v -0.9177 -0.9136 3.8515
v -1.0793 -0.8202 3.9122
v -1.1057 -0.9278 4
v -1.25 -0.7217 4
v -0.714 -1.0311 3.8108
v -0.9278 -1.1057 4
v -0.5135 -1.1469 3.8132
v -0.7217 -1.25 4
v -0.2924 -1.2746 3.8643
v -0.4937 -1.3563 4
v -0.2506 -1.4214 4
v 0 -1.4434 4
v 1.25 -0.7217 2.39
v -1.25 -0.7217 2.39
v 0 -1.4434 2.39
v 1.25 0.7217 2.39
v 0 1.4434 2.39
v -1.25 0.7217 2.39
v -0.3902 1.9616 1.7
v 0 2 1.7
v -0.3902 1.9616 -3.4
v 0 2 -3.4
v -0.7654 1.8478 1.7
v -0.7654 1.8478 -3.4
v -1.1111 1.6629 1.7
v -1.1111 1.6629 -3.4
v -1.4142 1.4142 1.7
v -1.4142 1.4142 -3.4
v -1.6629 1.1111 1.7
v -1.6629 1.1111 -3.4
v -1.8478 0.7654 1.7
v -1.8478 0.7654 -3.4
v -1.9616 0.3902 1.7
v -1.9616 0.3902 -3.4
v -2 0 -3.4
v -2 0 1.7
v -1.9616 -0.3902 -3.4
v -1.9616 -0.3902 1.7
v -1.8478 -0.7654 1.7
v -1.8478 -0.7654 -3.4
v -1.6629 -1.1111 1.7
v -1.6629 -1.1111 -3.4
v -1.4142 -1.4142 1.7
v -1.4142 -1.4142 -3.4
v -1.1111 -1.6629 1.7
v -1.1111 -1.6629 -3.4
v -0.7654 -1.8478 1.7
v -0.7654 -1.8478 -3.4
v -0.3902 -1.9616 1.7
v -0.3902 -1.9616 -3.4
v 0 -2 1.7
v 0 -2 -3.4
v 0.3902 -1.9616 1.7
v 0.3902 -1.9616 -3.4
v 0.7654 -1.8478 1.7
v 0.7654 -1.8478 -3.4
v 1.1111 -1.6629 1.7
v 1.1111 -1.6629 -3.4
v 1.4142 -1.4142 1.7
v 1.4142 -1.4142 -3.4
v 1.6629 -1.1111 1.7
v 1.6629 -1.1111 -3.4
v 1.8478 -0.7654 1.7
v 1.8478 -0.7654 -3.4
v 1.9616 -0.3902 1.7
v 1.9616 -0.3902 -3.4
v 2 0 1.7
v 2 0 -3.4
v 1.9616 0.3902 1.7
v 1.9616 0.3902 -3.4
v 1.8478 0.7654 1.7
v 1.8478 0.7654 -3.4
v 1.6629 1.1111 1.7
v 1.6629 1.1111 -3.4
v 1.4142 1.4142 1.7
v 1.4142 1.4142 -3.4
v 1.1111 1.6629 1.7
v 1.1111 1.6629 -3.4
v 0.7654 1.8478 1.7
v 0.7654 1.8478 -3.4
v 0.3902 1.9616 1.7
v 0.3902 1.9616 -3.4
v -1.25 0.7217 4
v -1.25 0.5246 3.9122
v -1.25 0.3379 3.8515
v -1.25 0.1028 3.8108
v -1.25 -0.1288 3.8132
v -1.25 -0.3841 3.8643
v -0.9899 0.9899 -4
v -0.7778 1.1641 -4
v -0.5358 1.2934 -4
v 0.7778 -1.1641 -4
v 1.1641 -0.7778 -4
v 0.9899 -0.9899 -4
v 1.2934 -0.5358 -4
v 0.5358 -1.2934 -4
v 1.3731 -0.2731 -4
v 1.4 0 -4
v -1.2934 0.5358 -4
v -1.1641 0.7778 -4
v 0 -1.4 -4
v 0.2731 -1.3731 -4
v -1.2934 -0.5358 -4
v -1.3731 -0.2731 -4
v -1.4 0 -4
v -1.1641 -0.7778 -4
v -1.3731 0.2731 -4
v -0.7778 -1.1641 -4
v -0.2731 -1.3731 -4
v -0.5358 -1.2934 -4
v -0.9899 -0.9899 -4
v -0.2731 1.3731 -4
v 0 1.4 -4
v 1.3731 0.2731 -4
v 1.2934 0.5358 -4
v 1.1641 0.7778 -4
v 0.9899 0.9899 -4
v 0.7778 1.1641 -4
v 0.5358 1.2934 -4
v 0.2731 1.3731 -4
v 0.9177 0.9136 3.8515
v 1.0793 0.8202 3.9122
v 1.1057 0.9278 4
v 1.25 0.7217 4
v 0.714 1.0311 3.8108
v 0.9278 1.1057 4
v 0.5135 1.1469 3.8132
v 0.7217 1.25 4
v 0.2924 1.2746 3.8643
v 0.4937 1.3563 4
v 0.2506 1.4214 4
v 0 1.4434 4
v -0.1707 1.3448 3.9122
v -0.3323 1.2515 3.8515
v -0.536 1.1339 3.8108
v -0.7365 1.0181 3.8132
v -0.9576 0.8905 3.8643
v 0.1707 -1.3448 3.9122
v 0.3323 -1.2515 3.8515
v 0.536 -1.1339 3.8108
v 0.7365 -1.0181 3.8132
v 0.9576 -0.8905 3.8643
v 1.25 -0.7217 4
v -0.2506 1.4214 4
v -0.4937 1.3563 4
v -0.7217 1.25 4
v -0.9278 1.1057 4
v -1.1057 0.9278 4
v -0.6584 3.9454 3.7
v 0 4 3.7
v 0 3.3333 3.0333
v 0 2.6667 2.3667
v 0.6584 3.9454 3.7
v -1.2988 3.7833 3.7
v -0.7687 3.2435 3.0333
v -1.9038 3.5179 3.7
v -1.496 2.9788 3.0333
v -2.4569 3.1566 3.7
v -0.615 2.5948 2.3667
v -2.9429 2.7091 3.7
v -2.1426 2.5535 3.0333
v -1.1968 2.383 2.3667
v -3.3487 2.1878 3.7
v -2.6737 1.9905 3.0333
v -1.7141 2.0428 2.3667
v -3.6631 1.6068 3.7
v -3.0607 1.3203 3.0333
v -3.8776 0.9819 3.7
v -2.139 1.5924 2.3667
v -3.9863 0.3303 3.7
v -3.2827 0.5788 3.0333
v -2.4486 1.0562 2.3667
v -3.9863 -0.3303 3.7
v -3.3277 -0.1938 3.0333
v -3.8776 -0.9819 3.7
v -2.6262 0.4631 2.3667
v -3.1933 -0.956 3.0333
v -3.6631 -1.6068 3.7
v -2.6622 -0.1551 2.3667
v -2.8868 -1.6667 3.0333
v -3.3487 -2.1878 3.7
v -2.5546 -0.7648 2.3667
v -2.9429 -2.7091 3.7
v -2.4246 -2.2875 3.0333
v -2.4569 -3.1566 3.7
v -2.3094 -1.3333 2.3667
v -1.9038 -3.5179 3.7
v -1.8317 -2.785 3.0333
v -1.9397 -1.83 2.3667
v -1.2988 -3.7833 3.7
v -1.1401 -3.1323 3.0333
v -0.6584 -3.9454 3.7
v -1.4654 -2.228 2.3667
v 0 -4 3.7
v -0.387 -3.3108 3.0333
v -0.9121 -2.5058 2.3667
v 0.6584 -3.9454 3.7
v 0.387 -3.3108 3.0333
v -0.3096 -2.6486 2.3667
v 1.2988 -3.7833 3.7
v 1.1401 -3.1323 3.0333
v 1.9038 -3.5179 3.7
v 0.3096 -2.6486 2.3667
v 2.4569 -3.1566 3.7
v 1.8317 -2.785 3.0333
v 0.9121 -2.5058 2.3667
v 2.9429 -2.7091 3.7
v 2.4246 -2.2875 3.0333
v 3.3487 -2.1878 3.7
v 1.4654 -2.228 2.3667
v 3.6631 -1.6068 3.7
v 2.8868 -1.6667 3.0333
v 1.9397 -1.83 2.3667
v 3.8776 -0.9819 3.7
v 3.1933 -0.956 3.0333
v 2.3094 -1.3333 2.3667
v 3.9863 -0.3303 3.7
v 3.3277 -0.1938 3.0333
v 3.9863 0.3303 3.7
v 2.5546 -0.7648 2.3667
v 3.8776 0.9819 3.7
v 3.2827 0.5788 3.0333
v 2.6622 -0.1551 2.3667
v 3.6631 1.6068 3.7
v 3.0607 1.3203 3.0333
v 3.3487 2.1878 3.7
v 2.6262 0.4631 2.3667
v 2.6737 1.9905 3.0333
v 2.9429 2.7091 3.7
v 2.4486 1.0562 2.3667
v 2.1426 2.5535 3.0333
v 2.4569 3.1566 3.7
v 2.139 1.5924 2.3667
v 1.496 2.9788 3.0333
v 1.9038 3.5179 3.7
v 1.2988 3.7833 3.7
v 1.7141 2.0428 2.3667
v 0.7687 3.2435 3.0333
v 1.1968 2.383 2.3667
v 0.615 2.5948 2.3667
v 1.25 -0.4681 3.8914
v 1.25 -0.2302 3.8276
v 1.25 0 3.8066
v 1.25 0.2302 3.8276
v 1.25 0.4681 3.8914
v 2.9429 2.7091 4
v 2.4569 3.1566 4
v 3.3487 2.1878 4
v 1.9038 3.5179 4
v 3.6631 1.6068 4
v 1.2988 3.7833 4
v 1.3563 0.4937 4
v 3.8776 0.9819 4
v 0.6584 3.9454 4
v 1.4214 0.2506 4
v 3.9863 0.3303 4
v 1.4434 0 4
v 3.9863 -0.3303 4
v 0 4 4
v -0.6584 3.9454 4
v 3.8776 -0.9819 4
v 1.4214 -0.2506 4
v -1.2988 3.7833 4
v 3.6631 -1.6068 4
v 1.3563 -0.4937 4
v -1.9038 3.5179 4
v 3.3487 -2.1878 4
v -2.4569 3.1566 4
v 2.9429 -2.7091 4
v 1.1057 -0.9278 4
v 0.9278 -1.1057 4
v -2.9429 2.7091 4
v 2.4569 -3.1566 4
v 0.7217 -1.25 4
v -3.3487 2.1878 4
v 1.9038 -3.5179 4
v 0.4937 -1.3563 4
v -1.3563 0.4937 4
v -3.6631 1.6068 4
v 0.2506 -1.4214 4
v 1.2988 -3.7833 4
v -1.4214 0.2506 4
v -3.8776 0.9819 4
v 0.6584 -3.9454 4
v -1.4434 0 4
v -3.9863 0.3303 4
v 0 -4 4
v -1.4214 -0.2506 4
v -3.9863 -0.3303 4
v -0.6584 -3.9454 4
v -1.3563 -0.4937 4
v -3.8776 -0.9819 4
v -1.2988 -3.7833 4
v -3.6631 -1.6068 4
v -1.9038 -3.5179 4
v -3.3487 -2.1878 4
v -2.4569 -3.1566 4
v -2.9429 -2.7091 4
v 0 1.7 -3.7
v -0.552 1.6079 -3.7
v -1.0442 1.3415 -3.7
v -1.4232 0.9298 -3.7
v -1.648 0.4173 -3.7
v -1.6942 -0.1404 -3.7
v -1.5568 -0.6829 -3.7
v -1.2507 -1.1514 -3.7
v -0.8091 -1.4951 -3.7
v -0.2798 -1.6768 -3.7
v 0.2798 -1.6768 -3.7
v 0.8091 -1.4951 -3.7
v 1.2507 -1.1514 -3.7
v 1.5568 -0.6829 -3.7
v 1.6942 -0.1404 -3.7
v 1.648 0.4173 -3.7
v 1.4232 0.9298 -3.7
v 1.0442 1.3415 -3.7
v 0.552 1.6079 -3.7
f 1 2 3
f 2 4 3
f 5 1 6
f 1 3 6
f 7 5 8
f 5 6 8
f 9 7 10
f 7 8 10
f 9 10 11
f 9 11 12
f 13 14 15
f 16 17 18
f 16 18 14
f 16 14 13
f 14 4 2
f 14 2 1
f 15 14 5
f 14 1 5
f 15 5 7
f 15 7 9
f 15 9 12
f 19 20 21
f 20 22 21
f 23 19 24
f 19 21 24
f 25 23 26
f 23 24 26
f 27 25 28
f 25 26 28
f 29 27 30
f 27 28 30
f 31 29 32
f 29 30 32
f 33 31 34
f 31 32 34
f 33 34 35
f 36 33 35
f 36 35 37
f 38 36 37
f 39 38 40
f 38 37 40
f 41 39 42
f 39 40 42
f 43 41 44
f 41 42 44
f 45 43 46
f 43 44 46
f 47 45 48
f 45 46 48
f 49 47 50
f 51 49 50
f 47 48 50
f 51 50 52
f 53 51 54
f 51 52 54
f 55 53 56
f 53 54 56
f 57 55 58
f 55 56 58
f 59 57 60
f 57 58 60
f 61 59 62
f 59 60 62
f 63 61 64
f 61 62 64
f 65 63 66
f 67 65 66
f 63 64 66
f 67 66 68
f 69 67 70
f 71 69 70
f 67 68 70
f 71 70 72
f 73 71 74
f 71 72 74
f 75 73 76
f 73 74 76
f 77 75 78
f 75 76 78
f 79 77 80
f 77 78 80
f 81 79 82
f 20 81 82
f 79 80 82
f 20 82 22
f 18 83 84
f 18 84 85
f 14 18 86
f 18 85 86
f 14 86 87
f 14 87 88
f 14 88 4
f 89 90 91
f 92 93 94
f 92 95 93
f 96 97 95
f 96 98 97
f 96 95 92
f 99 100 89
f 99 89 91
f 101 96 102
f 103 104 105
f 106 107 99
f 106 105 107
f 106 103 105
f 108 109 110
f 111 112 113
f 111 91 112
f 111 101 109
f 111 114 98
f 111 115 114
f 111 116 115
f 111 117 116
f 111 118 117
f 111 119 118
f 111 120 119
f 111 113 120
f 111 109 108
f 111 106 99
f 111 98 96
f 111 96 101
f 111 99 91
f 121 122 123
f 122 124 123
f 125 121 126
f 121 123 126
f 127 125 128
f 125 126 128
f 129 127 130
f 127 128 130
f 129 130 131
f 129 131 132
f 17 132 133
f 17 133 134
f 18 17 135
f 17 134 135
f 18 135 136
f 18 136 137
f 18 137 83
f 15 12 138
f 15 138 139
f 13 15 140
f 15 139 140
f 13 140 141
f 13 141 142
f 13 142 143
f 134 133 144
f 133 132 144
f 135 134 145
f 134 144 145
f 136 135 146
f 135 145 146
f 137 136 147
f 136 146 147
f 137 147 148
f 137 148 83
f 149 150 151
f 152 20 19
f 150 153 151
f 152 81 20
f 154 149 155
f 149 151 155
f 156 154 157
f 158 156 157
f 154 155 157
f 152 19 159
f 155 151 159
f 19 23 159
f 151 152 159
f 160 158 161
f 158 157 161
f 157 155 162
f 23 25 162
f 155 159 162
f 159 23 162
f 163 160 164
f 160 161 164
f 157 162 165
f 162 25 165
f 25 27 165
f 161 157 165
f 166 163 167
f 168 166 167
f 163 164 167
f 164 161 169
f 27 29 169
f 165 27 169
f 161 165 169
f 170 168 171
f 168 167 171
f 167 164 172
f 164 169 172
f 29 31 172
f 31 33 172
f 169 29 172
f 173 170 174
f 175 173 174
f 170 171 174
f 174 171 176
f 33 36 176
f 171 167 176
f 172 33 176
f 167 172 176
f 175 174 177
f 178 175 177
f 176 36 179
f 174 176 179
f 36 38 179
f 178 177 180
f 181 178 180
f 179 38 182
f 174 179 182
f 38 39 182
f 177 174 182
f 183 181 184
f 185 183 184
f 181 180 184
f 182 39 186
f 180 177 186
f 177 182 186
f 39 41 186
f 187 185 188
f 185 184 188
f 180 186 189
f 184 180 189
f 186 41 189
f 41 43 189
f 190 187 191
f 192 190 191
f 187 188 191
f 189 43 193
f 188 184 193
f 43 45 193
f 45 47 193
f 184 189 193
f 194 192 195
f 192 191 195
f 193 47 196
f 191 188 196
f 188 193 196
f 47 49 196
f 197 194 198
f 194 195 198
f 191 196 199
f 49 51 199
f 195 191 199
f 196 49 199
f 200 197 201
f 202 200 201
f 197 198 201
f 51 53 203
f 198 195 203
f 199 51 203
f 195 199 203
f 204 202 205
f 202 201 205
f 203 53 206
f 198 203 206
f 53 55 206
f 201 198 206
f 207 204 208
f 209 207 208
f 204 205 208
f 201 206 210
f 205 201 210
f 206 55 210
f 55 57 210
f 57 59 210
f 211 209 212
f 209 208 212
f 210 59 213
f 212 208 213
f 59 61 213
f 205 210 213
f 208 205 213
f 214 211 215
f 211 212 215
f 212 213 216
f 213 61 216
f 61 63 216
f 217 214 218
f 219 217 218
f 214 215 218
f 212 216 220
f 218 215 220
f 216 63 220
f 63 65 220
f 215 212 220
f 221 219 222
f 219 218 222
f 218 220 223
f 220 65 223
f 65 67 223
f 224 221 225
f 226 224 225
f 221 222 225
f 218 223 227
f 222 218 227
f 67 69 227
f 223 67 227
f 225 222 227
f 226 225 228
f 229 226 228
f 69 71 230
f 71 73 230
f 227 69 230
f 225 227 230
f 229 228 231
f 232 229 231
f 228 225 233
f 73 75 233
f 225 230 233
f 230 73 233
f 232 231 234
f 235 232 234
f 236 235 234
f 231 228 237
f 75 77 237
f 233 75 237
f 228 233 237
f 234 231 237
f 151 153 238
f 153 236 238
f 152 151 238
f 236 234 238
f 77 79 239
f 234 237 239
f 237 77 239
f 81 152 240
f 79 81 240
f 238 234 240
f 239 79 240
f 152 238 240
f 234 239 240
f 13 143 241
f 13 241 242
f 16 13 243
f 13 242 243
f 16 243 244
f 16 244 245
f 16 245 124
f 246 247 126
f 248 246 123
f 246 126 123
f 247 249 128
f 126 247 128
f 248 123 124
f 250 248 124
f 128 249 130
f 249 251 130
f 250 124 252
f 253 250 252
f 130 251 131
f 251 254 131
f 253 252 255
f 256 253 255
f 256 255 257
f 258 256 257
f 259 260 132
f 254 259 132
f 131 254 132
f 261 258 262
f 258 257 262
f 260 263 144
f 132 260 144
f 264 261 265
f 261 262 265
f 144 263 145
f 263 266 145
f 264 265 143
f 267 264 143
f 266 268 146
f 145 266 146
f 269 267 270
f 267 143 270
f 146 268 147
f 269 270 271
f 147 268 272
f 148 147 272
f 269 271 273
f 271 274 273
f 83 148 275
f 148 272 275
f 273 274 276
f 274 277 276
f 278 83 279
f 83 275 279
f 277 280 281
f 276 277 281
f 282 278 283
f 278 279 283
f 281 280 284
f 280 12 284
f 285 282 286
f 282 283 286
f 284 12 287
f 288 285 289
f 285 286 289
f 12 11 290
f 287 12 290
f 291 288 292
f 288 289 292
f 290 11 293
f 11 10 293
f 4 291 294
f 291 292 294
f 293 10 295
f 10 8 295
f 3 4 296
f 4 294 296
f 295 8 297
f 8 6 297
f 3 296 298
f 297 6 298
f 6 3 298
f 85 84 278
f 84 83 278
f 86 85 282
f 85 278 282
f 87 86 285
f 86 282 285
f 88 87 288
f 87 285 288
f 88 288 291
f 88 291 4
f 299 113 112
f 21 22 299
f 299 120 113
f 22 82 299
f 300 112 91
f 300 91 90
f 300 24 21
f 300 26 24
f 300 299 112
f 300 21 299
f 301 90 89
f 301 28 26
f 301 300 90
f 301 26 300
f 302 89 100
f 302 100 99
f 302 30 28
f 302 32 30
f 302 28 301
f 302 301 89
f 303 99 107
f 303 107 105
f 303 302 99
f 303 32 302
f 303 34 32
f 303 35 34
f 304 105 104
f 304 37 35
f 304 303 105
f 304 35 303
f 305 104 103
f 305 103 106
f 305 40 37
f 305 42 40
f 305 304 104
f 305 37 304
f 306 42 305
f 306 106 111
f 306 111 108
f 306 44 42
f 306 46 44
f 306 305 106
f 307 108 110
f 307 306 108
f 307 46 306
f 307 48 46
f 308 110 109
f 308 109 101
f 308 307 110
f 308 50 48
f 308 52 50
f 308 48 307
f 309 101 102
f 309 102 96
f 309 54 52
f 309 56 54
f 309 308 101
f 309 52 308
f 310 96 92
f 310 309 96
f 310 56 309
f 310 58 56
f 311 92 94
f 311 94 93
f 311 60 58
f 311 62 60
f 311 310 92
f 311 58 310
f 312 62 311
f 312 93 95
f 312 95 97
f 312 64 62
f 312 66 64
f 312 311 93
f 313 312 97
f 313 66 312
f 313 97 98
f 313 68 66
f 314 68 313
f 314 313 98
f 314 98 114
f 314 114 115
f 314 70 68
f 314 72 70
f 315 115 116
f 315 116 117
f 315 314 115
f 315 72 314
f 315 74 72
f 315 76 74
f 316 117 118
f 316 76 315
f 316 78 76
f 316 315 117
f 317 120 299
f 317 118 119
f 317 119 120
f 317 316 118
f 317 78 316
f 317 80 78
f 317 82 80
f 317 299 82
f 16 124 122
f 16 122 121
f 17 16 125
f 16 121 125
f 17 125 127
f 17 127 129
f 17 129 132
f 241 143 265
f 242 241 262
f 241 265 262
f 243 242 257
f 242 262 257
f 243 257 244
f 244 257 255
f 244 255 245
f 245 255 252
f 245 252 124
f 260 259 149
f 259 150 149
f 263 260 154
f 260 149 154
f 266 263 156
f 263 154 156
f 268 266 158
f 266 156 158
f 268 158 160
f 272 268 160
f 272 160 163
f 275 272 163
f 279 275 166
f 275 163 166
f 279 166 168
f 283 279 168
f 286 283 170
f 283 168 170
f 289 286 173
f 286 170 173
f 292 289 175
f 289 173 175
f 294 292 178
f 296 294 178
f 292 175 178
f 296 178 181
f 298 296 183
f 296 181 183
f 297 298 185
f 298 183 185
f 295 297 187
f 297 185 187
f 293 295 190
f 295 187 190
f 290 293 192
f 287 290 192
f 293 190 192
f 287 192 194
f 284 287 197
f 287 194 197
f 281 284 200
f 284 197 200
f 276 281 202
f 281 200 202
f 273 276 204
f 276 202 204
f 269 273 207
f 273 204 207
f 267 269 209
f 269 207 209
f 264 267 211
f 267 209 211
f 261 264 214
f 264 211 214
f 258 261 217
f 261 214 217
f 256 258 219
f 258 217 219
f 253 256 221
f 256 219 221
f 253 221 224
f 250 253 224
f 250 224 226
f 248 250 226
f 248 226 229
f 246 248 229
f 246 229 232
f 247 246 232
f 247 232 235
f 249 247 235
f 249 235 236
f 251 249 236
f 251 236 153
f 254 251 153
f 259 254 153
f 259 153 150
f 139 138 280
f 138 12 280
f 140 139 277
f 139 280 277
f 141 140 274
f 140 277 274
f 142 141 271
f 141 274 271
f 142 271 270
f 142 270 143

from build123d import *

# Parameters (mm, degrees)
SKETCH3_W          = 8
SKETCH3_H          = 2
CHAMFER1_SIZE      = 0.6
CUT_EXTRUDE1_DEPTH = 1.61
SKETCH9_R          = 1.443375673
CUT_EXTRUDE2_DEPTH = 1.61
CUT_EXTRUDE2_DRAFT = -45


with BuildPart() as part:
    # Sketch3 → Revolve1 (revolve)
    with BuildSketch(Plane(origin=(0, 0, 0), x_dir=(0, 0, -1), z_dir=(1, 0, 0))):
        with Locations((0, 1)):
            Rectangle(SKETCH3_W, SKETCH3_H)
    revolve(axis=Axis((0, 0, -4), (0, 0, 1)))

    # Chamfer1
    chamfer1_edges = [part.edges().sort_by_distance(p)[0] for p in [
        (0, -2, -4),
    ]]
    chamfer(chamfer1_edges, length=CHAMFER1_SIZE)

    # Sketch6 → Revolve2 (revolve)
    with BuildSketch(Plane(origin=(0, 0, 0), x_dir=(0, 0, -1), z_dir=(1, 0, 0))):
        Polygon((-4, 4), (-3.7, 4), (-1.7, 2), (-1.7, 0), (-4, 0), align=None)
    revolve(axis=Axis((0, 0, -4), (0, 0, 1)))

    # Sketch8 → Cut-Extrude1 (cut)
    with BuildSketch(Plane.XY.offset(4)):
        Polygon((0, 1.443375673), (-1.25, 0.721687836), (-1.25, -0.721687836), (0, -1.443375673), (1.25, -0.721687836), (1.25, 0.721687836), align=None)
    extrude(amount=-CUT_EXTRUDE1_DEPTH, mode=Mode.SUBTRACT)


with BuildPart() as cut_extrude2_tool:
    # Sketch9 → Cut-Extrude2 (with draft: the straight prism first)
    with BuildSketch(Plane.XY.offset(4)):
        Circle(SKETCH9_R)
    extrude(amount=-CUT_EXTRUDE2_DEPTH)
    # Cut-Extrude2: the draft: its side faces are tilted about the plane it starts from
    cut_extrude2_sides = [cut_extrude2_tool.faces().sort_by_distance(p)[0] for p in [
        (-1.443375673, 0, 3.195),
    ]]
    draft(cut_extrude2_sides, Plane.XY.offset(4), CUT_EXTRUDE2_DRAFT)


with BuildPart() as part_1:
    add(part.part)

    # Cut-Extrude2: cut by cut_extrude2_tool
    add(cut_extrude2_tool.part, mode=Mode.SUBTRACT)


solid = part_1.part
